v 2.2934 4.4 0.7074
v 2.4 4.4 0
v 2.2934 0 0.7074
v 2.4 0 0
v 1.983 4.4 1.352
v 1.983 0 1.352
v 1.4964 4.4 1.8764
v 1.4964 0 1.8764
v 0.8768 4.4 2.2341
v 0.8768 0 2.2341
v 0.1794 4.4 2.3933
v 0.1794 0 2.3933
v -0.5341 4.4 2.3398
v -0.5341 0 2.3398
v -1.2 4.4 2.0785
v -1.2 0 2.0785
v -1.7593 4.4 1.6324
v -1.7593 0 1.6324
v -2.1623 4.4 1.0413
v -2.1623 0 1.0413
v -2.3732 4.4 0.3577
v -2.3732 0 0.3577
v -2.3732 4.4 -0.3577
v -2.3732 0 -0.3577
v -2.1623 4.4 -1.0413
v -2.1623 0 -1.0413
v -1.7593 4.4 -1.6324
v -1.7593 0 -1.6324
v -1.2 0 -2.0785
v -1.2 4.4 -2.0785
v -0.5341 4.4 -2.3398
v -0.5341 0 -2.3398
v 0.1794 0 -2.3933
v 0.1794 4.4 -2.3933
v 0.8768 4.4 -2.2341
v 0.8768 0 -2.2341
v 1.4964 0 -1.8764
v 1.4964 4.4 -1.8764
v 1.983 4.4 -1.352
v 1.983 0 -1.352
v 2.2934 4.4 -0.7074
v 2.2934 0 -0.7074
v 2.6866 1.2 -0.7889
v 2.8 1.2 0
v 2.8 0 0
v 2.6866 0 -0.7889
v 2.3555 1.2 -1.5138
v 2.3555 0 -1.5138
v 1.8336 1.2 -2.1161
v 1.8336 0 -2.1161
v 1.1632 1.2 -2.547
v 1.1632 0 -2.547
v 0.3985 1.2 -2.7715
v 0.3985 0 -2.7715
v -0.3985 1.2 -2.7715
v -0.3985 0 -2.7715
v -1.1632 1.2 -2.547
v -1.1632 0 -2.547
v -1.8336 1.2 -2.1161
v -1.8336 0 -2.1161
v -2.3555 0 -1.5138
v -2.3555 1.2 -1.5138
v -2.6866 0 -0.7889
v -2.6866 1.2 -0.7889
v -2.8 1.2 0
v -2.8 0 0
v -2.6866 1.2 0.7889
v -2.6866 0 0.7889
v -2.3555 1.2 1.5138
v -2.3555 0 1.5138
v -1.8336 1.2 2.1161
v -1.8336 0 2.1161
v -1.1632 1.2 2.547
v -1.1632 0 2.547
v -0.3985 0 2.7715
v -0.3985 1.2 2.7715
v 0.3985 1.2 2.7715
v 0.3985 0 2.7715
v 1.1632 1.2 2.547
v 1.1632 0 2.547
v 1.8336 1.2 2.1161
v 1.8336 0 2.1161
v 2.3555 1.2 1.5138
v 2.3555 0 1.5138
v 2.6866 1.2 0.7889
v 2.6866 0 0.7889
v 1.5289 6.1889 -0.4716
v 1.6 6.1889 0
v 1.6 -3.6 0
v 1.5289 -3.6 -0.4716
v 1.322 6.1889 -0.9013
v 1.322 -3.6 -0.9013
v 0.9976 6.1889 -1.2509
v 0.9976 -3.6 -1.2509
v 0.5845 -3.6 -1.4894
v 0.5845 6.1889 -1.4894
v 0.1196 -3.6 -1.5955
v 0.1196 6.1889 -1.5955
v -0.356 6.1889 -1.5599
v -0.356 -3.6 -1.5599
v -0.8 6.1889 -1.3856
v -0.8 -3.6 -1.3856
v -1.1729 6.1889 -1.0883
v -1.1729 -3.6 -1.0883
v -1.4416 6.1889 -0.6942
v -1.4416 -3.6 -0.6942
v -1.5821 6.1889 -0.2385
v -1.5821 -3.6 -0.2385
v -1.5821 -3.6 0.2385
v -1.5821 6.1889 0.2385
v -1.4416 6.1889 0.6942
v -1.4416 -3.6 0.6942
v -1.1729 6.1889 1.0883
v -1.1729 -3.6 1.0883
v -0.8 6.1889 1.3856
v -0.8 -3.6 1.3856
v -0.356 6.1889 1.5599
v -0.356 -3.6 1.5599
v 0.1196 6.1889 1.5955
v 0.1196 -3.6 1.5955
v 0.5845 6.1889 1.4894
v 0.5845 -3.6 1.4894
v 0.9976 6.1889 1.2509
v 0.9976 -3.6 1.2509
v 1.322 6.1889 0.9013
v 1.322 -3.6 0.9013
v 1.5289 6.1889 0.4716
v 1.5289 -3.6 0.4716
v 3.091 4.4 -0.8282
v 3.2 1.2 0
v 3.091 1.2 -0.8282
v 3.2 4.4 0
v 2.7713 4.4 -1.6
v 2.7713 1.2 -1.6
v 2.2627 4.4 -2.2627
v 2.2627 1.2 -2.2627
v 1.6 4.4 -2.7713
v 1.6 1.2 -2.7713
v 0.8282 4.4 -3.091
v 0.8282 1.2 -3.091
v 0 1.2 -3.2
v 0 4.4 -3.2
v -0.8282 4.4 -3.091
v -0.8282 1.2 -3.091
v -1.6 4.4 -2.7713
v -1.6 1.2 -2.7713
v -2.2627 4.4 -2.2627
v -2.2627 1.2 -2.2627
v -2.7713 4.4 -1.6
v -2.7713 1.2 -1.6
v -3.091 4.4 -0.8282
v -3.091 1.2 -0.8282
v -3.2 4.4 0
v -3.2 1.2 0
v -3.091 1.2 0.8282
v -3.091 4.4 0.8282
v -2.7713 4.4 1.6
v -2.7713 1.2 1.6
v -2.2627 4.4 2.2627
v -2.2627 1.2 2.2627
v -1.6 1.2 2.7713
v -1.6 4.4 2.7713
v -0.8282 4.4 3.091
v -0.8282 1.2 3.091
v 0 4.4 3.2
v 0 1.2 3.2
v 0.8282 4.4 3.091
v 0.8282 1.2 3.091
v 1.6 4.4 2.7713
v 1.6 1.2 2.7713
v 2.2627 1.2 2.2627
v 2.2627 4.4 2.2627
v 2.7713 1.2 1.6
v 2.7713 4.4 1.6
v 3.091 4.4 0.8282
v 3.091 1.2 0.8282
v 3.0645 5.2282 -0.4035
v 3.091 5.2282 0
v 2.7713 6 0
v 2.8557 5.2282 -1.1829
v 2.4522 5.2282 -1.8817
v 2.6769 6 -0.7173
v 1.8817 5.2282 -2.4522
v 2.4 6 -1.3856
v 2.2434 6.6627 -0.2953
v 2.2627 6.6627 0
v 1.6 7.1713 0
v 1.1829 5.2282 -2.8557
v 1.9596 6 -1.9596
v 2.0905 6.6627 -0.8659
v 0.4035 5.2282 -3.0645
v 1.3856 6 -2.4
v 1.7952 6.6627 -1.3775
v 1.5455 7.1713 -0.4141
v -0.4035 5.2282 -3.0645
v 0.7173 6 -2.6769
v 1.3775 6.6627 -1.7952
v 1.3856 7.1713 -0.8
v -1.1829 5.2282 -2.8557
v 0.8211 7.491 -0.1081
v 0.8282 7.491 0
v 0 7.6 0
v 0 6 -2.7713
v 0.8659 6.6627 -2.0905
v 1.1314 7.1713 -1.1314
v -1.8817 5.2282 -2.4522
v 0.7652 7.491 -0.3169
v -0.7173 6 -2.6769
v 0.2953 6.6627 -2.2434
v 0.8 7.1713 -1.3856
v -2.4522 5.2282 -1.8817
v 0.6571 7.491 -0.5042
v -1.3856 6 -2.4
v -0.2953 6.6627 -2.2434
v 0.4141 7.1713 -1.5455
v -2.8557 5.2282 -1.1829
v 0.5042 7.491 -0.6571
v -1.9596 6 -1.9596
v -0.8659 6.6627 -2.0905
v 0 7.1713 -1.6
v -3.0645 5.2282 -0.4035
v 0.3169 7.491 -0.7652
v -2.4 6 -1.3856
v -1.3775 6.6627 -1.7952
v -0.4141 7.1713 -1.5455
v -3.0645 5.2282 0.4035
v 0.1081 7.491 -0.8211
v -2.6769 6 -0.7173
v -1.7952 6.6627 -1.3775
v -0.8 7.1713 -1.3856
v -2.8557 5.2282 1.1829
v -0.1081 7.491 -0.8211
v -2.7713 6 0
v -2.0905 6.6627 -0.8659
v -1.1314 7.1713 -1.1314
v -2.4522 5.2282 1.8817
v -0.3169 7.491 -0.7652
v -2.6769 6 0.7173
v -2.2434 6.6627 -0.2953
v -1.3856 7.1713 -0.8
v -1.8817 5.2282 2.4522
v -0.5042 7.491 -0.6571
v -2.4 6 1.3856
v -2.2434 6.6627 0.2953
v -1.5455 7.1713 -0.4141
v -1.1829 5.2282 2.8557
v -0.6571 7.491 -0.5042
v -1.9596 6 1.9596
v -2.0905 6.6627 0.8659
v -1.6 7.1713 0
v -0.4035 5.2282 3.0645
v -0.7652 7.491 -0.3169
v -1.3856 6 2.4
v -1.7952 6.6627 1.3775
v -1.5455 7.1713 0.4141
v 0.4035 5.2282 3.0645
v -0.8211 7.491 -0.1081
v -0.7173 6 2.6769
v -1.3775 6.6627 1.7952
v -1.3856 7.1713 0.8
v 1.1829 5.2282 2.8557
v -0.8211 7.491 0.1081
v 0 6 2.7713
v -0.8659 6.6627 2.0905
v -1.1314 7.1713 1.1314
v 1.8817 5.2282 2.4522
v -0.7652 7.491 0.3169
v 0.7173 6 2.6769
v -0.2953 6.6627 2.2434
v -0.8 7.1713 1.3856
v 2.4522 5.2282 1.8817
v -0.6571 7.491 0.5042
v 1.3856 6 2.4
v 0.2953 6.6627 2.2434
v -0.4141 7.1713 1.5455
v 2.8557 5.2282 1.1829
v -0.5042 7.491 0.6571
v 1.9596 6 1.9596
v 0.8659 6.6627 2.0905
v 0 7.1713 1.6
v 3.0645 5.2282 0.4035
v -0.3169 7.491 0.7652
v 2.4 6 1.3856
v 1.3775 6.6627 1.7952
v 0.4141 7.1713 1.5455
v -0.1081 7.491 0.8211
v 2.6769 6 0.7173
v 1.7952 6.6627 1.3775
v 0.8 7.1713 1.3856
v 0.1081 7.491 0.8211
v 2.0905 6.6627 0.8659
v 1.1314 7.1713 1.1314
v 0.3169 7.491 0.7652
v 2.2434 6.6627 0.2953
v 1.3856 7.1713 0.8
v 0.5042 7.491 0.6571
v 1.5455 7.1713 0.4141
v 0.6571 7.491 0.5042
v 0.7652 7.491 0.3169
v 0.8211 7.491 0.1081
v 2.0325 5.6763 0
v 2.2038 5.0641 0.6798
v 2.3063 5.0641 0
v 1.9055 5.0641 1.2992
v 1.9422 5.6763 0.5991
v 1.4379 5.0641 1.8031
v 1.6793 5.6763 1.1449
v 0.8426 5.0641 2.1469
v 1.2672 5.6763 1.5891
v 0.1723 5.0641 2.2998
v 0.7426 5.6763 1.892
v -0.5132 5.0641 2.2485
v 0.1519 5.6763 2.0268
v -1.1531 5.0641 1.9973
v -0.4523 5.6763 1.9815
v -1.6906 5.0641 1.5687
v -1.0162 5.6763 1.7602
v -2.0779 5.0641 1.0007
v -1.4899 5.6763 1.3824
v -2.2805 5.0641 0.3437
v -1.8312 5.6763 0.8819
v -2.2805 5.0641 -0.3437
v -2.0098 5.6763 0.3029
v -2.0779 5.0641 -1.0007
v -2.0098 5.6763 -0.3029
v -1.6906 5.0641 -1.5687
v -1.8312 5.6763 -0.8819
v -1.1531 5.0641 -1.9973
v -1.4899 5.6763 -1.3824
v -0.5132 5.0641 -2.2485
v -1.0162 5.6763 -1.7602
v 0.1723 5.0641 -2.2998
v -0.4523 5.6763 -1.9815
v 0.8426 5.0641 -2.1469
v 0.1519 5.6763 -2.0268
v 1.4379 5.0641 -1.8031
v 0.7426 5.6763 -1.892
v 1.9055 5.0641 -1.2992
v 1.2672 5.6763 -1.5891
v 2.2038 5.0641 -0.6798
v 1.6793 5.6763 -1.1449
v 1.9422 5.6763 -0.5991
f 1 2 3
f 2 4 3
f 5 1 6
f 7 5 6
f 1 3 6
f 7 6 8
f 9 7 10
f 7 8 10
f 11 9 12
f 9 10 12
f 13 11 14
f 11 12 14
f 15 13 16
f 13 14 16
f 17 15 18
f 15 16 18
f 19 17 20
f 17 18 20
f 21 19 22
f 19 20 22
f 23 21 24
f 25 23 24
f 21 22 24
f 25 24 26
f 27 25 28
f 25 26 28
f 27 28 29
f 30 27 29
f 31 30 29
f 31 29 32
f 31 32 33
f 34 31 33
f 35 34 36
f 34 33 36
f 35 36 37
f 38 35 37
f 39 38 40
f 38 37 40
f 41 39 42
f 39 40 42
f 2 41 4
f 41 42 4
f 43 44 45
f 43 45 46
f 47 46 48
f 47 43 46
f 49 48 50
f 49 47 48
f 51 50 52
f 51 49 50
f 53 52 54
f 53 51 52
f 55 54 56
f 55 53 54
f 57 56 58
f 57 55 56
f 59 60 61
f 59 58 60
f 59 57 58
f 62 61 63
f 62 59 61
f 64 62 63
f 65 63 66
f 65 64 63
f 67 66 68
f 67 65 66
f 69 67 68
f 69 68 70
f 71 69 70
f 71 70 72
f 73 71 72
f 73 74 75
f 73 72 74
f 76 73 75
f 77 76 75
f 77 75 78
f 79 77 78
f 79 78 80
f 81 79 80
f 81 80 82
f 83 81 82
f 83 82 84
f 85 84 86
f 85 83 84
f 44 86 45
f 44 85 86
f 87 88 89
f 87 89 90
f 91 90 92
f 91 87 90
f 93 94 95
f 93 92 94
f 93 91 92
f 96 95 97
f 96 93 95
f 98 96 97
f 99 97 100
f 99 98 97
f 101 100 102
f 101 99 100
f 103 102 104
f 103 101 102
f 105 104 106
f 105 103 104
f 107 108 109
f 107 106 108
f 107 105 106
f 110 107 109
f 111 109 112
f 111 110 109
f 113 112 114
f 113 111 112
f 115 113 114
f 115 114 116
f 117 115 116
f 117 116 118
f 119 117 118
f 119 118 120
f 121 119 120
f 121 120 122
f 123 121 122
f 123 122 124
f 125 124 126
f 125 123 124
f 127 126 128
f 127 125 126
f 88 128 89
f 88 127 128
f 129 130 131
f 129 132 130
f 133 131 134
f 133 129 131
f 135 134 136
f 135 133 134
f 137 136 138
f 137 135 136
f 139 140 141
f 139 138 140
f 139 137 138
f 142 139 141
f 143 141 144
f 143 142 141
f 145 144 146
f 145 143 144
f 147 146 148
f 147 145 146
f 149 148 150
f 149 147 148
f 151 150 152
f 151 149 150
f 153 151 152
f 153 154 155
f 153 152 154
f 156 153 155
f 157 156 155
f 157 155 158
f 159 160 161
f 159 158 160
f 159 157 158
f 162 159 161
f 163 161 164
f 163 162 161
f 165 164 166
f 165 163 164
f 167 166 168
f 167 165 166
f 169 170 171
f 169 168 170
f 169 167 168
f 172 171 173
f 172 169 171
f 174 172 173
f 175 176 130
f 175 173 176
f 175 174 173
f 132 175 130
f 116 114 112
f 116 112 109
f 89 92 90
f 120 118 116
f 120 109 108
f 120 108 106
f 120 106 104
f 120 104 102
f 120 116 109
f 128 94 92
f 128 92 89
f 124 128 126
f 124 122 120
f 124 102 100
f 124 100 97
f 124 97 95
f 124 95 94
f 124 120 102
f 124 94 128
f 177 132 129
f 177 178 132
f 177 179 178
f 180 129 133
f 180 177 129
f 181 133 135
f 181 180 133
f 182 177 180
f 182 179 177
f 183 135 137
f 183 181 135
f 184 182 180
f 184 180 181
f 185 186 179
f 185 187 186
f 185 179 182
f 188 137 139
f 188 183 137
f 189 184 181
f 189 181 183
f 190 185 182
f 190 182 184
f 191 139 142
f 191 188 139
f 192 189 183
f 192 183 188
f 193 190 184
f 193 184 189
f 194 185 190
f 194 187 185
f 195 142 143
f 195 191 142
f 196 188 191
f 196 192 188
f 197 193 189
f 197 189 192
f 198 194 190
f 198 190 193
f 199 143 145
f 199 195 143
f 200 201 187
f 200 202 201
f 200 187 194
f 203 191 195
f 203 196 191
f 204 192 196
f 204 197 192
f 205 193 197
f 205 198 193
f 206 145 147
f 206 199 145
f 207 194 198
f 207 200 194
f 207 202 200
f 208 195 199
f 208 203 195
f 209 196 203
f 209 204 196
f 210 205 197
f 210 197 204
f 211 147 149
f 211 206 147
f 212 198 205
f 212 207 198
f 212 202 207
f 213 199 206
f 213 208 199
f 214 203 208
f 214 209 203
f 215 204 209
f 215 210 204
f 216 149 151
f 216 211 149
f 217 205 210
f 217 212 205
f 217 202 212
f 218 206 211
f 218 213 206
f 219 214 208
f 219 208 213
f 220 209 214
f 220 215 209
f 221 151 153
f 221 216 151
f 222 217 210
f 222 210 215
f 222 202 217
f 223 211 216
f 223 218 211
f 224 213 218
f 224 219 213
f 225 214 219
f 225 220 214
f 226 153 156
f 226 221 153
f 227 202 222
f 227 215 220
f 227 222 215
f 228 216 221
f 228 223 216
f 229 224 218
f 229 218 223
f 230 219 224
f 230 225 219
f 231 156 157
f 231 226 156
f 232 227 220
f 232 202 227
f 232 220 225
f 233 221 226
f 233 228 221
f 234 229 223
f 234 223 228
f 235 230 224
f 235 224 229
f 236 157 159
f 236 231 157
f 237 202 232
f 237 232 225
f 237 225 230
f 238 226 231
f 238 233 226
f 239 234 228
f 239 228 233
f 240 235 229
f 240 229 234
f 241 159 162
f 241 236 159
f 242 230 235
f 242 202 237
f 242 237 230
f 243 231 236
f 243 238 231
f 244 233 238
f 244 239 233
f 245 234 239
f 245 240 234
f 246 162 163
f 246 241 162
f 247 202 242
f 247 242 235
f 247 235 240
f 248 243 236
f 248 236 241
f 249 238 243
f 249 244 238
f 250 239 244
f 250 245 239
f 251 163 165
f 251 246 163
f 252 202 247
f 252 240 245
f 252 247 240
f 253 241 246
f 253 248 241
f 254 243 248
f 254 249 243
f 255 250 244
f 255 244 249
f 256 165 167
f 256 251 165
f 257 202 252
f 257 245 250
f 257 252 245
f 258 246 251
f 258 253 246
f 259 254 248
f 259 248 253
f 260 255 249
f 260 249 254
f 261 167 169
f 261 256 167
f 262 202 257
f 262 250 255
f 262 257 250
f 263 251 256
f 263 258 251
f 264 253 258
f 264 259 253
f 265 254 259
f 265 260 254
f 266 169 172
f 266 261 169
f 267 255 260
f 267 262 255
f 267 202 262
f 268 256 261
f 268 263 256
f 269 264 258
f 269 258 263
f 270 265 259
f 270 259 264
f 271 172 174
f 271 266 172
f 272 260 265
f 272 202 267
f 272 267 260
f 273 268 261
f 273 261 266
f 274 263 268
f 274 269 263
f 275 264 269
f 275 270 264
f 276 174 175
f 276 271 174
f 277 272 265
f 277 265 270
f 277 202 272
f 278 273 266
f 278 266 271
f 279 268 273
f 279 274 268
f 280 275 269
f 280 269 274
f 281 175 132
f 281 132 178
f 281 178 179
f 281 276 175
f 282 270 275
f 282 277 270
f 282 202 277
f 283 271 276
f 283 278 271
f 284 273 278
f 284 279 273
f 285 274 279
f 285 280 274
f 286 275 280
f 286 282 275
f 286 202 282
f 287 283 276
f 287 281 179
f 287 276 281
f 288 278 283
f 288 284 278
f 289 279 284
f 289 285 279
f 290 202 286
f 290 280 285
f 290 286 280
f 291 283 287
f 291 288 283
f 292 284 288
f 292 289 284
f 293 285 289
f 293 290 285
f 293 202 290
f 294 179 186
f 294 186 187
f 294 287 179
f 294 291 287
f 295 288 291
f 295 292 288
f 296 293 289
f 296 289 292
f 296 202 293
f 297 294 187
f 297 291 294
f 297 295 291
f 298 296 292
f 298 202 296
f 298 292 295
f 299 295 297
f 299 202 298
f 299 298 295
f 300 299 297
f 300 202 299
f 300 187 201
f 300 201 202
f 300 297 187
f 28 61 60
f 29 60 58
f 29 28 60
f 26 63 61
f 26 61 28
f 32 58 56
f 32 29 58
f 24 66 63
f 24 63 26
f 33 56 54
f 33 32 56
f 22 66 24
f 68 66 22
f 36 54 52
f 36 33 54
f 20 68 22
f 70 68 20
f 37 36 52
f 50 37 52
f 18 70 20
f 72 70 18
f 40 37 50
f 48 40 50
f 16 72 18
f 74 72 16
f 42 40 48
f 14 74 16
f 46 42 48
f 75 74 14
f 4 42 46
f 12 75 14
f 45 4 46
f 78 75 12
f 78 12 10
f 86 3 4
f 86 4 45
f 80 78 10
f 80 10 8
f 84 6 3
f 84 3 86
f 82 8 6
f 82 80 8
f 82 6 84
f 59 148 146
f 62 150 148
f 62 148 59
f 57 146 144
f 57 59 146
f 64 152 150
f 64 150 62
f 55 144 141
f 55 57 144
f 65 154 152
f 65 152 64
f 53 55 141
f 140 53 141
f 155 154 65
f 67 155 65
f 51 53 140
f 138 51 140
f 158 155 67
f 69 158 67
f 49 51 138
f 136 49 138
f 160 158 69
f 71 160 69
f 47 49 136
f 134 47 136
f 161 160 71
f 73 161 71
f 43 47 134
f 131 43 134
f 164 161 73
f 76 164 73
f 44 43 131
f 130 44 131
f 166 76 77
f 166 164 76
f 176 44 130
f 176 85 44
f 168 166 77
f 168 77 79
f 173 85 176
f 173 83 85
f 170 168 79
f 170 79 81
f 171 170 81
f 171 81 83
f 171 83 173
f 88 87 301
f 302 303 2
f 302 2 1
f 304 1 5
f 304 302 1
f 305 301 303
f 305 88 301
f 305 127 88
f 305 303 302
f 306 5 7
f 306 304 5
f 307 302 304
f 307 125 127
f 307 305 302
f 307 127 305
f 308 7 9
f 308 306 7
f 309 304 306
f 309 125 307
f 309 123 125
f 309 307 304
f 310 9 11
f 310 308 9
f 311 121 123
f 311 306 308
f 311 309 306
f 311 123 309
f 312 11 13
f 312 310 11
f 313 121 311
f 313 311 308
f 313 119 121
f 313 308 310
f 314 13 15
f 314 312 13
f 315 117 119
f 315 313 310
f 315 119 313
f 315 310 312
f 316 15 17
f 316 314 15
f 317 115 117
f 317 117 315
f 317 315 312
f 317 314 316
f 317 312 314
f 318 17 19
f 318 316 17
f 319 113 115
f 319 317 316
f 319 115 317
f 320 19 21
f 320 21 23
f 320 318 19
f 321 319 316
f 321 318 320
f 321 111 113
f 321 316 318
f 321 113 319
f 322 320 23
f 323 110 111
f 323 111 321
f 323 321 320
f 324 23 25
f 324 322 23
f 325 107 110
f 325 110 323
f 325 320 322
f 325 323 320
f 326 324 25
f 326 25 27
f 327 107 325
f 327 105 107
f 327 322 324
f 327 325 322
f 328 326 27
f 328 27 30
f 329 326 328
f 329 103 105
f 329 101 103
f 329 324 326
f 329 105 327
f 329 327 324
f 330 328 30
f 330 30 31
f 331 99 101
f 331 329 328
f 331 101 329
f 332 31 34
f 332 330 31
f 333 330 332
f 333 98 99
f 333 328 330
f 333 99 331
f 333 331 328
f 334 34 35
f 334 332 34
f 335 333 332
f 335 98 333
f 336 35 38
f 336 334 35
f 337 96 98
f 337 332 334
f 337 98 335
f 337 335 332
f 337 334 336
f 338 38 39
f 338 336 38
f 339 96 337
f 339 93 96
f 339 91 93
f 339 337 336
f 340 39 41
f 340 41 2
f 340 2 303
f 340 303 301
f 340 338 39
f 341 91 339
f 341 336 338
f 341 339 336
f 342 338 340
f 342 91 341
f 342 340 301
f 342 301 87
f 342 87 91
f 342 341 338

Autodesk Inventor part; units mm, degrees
ref_plane "YZ Plane" through (0, 0, 0) normal (1, 0, 0) x (0, 1, 0)
ref_plane "XZ Plane" through (0, 0, 0) normal (0, 1, 0) x (-1, 0, 0)
ref_plane "XY Plane" through (0, 0, 0) normal (0, 0, 1) x (1, 0, 0)
sketch "Sketch2" plane through (0, 0, 0) normal (0, 0, 1) x (1, 0, 0)
  line L0 (2.4, 4.4) -> (2.4, 0)
  line L1 (2.4, 0) -> (2.8, 0)
  line L2 (2.8, 0) -> (2.8, 1.2)
  line L3 (2.8, 1.2) -> (3.2, 1.2)
  line L4 (3.2, 1.2) -> (3.2, 4.4)
  arc A0 (3.2, 4.4) -> (0, 7.6) centre (0, 4.4) ccw
  line L5 (0, 7.6) -> (0, -3.6)
  line L6 (0, -3.6) -> (1.6, -3.6)
  line L7 (1.6, -3.6) -> (1.6, 6.1889)
  arc A1 (2.4, 4.4) -> (1.6, 6.1889) centre (0, 4.4) ccw
  point P0 (0, 0)
  dimension "d0" = 3.6
  dimension "d1" = 6.4
  dimension "d2" = 5.6
  dimension "d3" = 1.2
  dimension "d4" = 3.2
  dimension "d5" = 6.4
  dimension "d6" = 4.8
revolve "Revolution1" add sketch "Sketch2" angle 360 about axis through (0, 7.6, 0) along (0, -1, 0)
equation "\"d4\" = rd"
equation "\"rd\" = 3.2"
properties part number "58176-TransRed" material "ABS Plastic"
